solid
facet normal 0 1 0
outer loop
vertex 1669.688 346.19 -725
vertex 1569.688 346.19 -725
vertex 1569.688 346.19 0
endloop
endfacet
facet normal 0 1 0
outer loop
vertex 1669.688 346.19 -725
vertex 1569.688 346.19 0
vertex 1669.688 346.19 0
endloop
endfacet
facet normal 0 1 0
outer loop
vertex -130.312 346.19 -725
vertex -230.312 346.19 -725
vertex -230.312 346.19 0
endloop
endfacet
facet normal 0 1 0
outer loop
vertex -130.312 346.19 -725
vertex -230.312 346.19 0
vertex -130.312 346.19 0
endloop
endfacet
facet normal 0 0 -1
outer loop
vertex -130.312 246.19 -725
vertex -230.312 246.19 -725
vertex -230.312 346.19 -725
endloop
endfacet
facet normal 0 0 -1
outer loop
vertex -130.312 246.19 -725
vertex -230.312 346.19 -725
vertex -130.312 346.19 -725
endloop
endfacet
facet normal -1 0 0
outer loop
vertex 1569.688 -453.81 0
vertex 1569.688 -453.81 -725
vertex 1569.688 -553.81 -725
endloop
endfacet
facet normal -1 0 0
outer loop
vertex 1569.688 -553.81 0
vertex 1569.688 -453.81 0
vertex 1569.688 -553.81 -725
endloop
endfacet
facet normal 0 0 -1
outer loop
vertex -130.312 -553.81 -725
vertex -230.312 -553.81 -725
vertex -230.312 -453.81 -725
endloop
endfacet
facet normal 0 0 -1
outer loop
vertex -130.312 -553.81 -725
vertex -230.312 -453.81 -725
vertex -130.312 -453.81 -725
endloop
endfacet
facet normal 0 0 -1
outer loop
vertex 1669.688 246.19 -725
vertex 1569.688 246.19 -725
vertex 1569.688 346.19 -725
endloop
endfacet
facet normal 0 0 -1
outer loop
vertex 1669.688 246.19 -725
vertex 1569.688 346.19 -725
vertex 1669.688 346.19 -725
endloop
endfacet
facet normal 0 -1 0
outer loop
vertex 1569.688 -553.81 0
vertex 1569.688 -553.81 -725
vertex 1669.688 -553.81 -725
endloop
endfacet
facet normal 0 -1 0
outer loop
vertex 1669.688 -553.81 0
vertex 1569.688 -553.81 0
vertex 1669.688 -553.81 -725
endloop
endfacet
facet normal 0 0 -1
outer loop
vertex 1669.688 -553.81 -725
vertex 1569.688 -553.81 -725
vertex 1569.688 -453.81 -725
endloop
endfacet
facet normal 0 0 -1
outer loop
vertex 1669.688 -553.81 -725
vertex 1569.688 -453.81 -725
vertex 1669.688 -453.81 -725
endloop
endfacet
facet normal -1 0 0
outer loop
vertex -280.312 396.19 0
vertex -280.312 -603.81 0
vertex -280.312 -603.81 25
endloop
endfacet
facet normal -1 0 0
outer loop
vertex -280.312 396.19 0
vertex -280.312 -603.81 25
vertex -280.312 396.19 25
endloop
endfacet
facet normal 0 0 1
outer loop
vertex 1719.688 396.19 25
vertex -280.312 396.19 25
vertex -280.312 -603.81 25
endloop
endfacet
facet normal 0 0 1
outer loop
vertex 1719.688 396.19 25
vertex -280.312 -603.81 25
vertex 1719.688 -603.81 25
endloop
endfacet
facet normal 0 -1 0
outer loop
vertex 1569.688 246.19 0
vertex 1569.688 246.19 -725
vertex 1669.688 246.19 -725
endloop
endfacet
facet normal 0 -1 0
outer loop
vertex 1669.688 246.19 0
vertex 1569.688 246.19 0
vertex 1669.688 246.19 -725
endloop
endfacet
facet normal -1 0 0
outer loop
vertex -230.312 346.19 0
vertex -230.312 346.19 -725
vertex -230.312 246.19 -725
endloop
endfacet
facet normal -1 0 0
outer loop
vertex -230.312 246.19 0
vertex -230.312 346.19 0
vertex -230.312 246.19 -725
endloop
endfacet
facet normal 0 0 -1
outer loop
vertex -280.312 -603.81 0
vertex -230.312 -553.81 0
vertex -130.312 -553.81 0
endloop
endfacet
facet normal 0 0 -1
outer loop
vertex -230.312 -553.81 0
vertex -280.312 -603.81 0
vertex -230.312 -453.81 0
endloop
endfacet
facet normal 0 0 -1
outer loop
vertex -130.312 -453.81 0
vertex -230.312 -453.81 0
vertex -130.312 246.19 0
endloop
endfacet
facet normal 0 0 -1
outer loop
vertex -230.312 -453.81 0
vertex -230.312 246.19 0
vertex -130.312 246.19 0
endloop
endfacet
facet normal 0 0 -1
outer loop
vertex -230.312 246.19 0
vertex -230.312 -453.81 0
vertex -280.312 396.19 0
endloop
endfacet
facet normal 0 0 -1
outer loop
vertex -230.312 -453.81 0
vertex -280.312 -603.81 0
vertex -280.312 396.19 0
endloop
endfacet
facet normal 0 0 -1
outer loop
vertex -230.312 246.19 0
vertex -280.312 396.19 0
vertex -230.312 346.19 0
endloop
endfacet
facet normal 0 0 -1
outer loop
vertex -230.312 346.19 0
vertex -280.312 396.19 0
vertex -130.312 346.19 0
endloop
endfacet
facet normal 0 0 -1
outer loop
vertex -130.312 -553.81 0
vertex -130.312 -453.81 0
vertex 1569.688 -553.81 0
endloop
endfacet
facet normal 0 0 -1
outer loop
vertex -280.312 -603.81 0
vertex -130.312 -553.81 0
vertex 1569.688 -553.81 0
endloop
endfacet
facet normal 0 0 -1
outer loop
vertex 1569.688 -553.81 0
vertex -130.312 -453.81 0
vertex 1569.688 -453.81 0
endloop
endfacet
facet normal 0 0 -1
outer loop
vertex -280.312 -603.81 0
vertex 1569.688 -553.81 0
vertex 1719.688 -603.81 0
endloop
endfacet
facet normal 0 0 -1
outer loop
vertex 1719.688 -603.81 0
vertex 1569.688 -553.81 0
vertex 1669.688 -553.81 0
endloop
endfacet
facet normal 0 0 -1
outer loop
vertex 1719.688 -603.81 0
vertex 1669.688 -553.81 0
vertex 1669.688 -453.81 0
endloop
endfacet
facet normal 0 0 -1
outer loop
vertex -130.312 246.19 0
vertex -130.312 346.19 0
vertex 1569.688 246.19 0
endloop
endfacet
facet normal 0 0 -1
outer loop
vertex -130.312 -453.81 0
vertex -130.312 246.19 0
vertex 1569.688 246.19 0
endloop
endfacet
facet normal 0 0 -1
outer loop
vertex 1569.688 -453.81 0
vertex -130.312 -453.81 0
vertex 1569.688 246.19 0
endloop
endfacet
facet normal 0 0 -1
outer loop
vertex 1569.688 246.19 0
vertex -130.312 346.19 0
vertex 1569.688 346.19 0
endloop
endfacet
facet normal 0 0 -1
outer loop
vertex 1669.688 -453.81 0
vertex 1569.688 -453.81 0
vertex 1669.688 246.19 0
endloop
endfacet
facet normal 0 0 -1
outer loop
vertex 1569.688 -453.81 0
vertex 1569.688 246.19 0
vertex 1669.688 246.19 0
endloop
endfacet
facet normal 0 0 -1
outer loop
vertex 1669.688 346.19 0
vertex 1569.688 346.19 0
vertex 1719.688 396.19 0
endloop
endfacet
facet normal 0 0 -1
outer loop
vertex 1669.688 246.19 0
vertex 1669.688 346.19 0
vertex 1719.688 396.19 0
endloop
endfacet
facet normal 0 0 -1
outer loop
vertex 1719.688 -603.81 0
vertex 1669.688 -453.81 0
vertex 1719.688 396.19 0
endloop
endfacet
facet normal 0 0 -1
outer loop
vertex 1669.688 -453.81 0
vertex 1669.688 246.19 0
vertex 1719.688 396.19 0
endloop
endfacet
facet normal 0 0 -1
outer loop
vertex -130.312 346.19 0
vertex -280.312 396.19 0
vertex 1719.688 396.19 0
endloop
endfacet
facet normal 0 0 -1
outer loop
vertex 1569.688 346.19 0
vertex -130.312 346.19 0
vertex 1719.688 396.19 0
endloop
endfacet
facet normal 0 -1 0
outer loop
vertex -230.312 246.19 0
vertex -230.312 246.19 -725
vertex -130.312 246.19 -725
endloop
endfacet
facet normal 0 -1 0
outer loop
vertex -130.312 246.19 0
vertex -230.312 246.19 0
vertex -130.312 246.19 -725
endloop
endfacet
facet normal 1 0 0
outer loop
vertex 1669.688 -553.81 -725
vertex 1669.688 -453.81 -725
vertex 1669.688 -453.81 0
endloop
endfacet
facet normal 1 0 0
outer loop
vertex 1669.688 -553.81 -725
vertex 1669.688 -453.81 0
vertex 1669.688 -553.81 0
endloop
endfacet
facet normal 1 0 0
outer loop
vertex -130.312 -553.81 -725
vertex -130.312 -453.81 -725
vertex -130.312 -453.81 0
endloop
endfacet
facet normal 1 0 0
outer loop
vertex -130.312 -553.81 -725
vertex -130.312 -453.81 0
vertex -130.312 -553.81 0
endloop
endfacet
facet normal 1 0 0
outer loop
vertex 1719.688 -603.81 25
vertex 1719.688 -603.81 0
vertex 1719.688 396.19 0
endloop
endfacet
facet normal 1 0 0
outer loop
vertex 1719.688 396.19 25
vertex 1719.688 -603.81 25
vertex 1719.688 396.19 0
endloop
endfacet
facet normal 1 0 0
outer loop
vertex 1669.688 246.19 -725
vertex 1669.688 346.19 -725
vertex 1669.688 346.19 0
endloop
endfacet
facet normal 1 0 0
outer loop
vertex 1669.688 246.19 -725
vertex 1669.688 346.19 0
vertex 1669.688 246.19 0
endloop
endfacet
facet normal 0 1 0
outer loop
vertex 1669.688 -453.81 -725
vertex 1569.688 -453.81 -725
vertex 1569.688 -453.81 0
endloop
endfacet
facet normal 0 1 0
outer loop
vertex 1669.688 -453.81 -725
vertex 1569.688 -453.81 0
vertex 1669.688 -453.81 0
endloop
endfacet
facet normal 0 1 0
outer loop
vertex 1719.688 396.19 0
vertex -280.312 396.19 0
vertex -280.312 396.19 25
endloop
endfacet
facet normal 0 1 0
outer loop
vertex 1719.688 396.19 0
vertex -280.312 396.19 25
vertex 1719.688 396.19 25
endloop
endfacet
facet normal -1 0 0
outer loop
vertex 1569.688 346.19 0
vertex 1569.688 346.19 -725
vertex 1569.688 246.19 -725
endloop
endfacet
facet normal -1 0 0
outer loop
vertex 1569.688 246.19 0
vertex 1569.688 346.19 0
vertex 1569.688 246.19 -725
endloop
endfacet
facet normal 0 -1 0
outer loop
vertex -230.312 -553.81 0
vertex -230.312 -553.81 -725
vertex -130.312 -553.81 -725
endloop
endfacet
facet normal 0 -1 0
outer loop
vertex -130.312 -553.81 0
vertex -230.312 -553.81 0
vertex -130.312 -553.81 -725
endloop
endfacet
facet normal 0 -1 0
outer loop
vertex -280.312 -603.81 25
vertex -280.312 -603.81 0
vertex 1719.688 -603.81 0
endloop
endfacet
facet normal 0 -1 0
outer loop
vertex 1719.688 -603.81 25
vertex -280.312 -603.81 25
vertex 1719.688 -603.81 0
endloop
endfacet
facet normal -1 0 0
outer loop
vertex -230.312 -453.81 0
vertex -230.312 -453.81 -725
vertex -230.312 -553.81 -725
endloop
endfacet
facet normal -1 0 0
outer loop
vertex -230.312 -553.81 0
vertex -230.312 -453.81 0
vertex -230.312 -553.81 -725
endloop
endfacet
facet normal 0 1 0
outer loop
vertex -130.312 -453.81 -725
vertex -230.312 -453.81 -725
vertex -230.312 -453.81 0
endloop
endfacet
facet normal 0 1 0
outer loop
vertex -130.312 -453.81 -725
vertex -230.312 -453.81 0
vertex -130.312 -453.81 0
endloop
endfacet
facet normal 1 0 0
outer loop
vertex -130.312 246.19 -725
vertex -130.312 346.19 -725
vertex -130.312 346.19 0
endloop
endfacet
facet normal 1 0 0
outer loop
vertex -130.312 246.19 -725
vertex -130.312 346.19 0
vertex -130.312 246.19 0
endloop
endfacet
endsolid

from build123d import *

# Parameters (mm, degrees)
F0_W     = 2000
F0_H     = 1000
F1_DEPTH = 25
F2_W     = 100
F2_H     = 100
F3_DEPTH = 725


with BuildPart() as f1:
    # F0 (on Top) → F1 (new body)
    with BuildSketch(Plane.XY):
        with Locations((719.687551, -103.809536)):
            Rectangle(F0_W, F0_H)
    extrude(amount=F1_DEPTH)

    # F2 (on face) → F3 (join)
    with BuildSketch(Plane(origin=(0, 0, 0), x_dir=(1, 0, 0), z_dir=(0, 0, -1))):
        with Locations((-180.312449, 503.809536)):
            Rectangle(F2_W, F2_H)
        with Locations((-180.312449, -296.190464)):
            Rectangle(F2_W, F2_H)
        with Locations((1619.687551, 503.809536)):
            Rectangle(F2_W, F2_H)
        with Locations((1619.687551, -296.190464)):
            Rectangle(F2_W, F2_H)
    extrude(amount=F3_DEPTH)


solid = f1.part
